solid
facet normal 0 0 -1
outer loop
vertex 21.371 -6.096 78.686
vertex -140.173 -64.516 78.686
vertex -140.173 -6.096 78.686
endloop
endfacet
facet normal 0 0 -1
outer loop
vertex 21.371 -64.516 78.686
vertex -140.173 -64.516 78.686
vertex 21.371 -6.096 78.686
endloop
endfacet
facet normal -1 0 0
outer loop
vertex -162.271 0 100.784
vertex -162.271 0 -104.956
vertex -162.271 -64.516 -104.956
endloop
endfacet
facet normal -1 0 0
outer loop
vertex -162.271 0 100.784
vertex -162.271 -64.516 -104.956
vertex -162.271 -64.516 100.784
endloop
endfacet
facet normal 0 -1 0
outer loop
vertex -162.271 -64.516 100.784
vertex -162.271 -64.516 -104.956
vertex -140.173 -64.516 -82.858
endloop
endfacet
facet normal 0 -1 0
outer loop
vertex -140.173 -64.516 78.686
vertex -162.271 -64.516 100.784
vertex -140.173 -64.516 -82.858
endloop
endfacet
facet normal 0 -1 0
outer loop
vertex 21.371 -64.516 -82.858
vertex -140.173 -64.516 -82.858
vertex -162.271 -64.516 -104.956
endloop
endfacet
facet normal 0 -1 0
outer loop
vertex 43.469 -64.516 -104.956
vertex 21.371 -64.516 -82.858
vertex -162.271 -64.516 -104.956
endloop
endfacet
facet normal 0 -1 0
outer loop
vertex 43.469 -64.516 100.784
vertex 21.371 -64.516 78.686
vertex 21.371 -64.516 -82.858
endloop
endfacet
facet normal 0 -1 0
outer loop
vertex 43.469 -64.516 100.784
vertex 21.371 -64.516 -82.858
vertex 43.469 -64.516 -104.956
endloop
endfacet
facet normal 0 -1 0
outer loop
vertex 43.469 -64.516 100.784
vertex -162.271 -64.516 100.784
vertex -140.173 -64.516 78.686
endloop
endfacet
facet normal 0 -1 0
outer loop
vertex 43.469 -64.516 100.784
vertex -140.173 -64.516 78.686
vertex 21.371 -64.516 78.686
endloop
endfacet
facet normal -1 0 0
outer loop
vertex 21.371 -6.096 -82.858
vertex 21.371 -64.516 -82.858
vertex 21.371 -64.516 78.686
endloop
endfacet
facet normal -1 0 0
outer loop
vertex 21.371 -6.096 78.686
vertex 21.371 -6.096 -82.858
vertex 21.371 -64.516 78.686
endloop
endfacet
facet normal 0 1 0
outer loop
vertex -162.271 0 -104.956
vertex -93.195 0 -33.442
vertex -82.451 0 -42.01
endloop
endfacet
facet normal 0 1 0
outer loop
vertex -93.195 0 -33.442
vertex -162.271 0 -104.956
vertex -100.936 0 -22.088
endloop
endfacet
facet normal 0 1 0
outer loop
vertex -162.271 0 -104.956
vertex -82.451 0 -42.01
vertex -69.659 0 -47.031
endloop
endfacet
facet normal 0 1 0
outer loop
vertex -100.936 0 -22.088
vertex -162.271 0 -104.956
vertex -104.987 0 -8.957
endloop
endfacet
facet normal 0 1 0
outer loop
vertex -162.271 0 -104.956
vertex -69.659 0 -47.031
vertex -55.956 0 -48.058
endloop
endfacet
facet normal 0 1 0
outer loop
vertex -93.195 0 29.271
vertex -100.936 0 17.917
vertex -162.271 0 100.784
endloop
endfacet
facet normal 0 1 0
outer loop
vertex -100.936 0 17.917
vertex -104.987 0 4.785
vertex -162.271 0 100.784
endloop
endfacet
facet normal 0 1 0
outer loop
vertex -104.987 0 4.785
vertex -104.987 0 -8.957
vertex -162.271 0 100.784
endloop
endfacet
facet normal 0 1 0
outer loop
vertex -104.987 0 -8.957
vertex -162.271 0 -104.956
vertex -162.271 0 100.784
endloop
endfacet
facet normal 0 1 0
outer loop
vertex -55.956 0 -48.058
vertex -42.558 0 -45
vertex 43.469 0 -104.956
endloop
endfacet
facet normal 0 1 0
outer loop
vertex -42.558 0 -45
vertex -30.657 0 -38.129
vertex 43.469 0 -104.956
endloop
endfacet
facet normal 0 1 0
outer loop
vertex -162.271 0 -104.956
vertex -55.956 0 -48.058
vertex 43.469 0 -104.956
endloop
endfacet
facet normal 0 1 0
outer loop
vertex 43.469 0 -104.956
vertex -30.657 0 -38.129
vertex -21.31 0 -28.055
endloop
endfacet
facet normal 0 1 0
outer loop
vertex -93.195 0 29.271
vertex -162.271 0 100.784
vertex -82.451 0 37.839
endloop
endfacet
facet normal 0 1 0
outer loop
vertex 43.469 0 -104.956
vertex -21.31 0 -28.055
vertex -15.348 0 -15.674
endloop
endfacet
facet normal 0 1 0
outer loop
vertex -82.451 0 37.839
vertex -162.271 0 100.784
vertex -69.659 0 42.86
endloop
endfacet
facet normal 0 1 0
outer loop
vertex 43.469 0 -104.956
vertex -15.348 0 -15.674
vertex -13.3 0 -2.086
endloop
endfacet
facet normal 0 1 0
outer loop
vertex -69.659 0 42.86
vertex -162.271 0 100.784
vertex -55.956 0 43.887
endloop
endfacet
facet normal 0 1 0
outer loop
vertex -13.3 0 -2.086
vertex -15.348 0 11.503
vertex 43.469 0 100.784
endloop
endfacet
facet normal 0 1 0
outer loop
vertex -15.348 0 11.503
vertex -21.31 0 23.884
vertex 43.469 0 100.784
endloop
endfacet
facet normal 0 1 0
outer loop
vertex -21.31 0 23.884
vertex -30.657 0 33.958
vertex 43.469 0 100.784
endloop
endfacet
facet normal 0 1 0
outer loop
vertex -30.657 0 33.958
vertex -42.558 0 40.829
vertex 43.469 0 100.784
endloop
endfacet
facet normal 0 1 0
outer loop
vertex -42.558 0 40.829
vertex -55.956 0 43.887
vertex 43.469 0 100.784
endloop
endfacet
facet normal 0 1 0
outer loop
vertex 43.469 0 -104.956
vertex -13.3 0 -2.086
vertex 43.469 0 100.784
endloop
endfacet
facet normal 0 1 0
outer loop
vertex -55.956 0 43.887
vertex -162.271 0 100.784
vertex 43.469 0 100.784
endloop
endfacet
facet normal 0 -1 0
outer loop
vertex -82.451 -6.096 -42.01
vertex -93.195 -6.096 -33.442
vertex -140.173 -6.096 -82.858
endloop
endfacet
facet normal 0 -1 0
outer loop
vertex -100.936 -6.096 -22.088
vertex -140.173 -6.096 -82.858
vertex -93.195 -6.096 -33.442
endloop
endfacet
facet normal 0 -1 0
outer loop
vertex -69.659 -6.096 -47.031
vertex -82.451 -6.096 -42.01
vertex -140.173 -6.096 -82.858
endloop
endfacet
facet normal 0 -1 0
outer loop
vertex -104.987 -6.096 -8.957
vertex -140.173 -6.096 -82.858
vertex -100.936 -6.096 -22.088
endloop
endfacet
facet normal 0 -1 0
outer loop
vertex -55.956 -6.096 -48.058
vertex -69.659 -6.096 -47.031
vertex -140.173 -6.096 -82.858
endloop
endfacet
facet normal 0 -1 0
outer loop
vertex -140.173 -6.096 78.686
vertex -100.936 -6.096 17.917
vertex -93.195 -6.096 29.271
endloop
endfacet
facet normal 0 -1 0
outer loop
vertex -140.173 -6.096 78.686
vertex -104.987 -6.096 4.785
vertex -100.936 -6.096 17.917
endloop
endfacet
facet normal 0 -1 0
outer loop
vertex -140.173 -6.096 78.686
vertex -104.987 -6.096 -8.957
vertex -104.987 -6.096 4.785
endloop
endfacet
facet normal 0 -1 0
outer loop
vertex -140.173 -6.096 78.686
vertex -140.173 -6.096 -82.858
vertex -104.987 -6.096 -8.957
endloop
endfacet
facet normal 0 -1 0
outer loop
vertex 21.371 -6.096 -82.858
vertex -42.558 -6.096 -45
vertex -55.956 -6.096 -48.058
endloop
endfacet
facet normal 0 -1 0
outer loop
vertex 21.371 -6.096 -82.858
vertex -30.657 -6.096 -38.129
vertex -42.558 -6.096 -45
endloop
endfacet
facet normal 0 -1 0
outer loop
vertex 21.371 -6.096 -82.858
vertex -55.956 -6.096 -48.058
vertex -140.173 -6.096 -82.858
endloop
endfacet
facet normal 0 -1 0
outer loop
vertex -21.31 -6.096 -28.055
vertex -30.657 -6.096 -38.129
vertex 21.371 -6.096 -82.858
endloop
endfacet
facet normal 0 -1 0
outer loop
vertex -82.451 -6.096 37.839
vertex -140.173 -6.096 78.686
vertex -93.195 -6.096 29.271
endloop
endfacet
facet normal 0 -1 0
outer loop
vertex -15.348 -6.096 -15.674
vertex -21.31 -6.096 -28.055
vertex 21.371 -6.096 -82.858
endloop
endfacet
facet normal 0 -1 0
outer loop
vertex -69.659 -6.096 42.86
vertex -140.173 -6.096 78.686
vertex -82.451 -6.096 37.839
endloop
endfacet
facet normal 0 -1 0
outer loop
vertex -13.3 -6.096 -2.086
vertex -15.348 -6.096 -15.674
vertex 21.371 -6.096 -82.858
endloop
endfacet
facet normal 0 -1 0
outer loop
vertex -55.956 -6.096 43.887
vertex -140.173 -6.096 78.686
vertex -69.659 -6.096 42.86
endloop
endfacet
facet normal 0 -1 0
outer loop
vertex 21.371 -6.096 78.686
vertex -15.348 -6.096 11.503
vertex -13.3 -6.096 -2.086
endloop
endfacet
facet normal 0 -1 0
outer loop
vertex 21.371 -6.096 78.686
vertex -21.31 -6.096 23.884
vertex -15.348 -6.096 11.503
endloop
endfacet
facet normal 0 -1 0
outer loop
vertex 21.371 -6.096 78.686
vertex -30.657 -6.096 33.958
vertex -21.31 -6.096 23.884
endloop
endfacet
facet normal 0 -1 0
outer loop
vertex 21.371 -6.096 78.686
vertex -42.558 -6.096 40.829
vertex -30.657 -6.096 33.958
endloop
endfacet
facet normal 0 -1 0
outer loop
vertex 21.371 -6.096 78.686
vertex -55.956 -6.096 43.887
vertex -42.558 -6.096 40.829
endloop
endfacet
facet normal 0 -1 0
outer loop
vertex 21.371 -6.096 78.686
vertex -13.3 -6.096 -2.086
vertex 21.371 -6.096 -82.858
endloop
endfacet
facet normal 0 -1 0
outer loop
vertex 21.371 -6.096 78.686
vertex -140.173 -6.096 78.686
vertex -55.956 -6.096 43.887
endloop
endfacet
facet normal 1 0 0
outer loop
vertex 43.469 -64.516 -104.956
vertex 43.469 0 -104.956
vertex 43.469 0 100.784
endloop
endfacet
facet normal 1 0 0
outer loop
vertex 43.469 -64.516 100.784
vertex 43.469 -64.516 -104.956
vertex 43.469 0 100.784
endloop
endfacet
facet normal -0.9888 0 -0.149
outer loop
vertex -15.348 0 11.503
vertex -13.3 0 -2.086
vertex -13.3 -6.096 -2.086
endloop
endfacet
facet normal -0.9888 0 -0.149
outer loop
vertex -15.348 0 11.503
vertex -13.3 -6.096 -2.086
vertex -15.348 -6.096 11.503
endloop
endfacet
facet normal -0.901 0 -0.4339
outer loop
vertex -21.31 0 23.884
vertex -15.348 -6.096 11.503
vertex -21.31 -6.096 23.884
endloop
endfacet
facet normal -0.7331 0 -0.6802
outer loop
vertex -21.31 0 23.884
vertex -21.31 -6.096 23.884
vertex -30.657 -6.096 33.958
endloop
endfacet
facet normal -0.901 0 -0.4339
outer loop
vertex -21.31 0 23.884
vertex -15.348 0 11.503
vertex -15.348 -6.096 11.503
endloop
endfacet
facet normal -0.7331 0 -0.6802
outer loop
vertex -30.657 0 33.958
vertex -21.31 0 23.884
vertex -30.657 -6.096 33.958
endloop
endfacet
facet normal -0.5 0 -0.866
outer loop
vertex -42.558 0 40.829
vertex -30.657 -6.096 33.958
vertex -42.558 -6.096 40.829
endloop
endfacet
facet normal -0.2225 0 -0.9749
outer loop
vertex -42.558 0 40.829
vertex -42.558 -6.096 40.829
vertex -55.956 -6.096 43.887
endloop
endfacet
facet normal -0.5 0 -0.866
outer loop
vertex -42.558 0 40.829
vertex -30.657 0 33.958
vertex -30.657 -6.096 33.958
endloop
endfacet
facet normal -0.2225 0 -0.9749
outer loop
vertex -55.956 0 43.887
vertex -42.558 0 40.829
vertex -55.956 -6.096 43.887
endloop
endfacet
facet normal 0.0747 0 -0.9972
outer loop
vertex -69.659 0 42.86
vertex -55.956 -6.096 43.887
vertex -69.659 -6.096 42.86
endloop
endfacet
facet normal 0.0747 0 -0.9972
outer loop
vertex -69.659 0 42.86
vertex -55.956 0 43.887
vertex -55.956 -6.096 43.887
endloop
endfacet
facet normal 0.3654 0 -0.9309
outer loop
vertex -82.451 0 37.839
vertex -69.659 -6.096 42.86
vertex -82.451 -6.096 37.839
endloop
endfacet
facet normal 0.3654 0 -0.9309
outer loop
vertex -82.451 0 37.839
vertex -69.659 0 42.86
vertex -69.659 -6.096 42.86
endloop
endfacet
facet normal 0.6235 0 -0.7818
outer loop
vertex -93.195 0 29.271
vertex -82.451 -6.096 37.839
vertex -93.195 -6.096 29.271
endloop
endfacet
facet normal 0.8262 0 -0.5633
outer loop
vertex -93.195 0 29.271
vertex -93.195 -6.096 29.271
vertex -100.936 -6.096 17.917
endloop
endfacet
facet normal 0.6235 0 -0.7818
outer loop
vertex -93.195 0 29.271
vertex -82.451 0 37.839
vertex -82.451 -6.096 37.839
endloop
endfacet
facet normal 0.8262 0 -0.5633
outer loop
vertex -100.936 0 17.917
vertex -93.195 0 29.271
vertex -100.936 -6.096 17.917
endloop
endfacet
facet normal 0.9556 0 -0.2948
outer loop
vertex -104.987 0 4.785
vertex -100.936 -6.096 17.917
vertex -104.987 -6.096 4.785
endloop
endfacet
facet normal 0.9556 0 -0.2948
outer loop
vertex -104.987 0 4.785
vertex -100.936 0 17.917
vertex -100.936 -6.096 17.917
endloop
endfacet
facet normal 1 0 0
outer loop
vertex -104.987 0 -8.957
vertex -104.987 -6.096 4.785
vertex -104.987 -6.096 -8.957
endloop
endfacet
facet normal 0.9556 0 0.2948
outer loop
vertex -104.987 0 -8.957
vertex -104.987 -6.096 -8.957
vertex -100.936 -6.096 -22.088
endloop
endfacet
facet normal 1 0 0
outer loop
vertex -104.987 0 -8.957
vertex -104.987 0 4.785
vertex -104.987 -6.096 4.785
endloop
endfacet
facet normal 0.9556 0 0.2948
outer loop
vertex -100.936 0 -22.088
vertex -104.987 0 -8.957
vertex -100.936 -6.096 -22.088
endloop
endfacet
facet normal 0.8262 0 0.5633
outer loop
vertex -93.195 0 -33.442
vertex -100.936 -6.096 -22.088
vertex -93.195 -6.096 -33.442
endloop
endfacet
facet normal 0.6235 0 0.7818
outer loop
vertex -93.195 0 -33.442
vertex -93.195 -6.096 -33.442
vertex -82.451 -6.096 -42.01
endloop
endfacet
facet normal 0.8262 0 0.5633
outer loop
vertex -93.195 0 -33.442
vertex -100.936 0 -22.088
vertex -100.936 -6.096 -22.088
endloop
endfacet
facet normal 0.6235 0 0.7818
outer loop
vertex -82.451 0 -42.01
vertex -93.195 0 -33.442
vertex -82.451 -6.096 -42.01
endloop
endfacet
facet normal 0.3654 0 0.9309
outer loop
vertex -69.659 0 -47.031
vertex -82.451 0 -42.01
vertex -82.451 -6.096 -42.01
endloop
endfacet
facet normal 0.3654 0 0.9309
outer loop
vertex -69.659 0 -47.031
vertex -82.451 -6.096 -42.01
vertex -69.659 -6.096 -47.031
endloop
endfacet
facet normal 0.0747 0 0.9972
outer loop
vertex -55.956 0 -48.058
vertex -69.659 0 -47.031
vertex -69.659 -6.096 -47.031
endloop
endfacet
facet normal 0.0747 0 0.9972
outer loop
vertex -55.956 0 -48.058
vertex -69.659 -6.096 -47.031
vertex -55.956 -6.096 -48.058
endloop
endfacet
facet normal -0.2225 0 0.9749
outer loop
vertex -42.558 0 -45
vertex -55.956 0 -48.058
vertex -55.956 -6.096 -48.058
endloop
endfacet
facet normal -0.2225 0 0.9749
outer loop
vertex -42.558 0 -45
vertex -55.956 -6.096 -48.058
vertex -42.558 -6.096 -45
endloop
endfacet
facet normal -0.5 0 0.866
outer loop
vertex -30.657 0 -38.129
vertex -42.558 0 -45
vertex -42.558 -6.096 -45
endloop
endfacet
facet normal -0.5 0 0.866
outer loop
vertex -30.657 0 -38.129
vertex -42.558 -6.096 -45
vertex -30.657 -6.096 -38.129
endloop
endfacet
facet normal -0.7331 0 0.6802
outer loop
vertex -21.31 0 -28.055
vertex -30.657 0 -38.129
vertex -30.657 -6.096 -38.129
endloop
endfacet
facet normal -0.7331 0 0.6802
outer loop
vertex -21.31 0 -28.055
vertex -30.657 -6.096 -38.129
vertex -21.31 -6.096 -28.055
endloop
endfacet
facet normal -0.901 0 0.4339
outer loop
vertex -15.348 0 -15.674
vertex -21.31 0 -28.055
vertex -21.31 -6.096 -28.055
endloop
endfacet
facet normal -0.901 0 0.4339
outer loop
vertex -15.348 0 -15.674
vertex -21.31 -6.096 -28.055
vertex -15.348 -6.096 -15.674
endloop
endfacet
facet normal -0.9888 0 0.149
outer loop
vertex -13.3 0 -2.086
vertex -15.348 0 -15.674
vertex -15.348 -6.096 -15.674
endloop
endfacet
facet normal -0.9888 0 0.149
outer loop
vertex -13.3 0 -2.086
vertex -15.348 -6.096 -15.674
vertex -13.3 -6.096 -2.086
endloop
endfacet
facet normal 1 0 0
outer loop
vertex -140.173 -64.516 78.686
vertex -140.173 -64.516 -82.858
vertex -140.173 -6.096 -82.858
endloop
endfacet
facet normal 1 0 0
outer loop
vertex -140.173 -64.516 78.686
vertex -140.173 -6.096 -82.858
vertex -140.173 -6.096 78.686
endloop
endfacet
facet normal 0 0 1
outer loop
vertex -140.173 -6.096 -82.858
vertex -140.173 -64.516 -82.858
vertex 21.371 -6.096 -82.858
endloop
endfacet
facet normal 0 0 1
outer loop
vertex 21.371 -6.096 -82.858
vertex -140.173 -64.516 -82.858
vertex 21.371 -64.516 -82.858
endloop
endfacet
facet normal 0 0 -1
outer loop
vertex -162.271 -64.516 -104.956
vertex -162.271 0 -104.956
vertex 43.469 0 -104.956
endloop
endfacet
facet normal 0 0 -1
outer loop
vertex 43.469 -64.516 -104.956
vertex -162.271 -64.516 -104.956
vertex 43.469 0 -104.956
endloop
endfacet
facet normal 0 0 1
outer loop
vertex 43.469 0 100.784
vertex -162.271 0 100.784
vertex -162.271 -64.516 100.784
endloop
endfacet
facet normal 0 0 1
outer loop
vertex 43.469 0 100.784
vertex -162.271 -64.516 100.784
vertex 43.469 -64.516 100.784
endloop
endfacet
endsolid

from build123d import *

# Parameters (mm, degrees)
F0_W     = 205.74
F0_H     = 205.74
F0_R     = 46.101
F1_DEPTH = 64.516
F2_W     = 161.544
F2_H     = 161.544
F2_R     = 46.101
F3_DEPTH = 58.42


with BuildPart() as f1:
    # F0 (on Front) → F1 (new body)
    with BuildSketch(Plane.XZ):
        with Locations((-59.400756, -2.085568)):
            Rectangle(F0_W, F0_H)
        with Locations((-59.400756, -2.085568)):
            Circle(F0_R, mode=Mode.SUBTRACT)
    extrude(amount=F1_DEPTH)

    # F2 (on face) → F3 (cut)
    with BuildSketch(Plane.XZ.offset(64.516)):
        with Locations((-59.400756, -2.085568)):
            Rectangle(F2_W, F2_H)
        with Locations((-59.400756, -2.085568)):
            Circle(F2_R, mode=Mode.SUBTRACT)
    extrude(amount=-F3_DEPTH, mode=Mode.SUBTRACT)


solid = f1.part
